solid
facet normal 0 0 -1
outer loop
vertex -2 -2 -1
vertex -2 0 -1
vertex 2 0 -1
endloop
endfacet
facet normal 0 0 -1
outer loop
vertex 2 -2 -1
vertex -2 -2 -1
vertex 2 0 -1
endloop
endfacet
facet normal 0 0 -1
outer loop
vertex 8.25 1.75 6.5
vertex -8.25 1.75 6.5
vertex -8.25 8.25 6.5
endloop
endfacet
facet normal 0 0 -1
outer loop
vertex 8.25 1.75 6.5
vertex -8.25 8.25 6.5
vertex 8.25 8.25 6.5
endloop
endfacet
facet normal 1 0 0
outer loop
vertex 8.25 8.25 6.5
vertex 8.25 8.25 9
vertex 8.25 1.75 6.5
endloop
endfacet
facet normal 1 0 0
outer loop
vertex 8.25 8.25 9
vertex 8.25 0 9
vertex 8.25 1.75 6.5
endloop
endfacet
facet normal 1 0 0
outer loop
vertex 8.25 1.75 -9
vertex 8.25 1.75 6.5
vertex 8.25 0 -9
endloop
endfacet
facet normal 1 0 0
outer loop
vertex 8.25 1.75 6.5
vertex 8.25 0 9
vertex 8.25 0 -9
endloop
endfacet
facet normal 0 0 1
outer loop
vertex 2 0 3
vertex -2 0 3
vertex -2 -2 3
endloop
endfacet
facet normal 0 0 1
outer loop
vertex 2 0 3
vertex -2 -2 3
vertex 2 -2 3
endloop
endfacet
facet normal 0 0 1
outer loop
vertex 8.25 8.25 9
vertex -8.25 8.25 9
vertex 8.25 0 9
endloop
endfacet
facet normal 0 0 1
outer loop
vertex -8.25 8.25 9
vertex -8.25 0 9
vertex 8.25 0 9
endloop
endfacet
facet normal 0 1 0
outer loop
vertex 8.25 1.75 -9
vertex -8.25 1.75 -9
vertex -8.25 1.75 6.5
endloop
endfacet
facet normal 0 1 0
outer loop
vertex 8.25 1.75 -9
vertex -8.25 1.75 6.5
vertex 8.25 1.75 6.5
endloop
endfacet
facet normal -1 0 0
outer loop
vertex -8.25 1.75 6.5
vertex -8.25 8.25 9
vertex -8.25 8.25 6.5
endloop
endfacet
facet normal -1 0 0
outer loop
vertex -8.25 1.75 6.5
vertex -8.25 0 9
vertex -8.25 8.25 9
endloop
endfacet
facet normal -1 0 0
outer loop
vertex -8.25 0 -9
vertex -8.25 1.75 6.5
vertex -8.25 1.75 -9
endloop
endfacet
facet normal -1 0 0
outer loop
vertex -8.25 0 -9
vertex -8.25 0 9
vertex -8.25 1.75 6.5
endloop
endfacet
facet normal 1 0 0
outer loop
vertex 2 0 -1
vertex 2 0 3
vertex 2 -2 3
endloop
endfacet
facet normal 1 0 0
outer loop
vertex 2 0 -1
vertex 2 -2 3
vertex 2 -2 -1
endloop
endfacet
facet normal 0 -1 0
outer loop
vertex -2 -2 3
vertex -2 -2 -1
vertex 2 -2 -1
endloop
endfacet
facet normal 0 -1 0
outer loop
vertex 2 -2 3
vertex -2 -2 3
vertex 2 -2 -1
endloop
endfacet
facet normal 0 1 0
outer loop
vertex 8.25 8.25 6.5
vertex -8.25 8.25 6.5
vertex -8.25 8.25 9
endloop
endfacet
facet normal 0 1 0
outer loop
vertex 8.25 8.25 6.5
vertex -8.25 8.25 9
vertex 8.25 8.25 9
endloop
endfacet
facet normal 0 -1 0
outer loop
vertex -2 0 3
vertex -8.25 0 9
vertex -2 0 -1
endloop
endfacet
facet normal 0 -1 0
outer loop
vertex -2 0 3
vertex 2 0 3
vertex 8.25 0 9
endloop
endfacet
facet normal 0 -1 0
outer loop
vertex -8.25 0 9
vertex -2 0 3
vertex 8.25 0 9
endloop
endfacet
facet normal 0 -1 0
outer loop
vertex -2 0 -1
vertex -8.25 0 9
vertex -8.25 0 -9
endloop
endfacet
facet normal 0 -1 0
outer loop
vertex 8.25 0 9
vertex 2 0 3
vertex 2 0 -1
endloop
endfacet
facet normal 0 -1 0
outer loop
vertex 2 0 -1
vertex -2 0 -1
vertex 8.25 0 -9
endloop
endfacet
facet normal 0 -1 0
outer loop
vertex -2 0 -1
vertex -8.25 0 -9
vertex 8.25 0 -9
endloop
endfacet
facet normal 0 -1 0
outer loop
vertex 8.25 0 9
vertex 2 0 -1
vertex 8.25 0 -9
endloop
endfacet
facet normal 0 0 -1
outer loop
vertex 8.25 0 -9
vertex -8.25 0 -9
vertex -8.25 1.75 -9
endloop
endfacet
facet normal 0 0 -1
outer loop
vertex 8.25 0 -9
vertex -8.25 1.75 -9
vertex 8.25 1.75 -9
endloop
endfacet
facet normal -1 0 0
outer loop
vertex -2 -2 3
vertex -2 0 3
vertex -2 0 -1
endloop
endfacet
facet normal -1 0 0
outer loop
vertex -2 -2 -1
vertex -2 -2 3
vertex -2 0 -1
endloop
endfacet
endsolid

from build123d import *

# Parameters (mm, degrees)
SKETCH1_W           = 16.5
SKETCH1_H           = 18
BOSS_EXTRUDE1_DEPTH = 1.75
SKETCH3_W           = 16.5
SKETCH3_H           = 2.5
BOSS_EXTRUDE2_DEPTH = 6.5
SKETCH2_W           = 4
SKETCH2_H           = 4
BOSS_EXTRUDE3_DEPTH = 2


with BuildPart() as part:
    # Sketch1 → Boss-Extrude1 (new body)
    with BuildSketch(Plane(origin=(0, 0, 0), x_dir=(1, 0, 0), z_dir=(0, 1, 0))):
        Rectangle(SKETCH1_W, SKETCH1_H)
    extrude(amount=BOSS_EXTRUDE1_DEPTH)

    # Sketch3 → Boss-Extrude2 (add)
    with BuildSketch(Plane(origin=(0, 1.75, 0), x_dir=(1, 0, 0), z_dir=(0, 1, 0))):
        with Locations((0, -7.75)):
            Rectangle(SKETCH3_W, SKETCH3_H)
    extrude(amount=BOSS_EXTRUDE2_DEPTH)

    # Sketch2 → Boss-Extrude3 (add)
    with BuildSketch(Plane(origin=(0, 0, 0), x_dir=(1, 0, 0), z_dir=(0, 1, 0))):
        with Locations((0, -1)):
            Rectangle(SKETCH2_W, SKETCH2_H)
    extrude(amount=-BOSS_EXTRUDE3_DEPTH)


solid = part.part
